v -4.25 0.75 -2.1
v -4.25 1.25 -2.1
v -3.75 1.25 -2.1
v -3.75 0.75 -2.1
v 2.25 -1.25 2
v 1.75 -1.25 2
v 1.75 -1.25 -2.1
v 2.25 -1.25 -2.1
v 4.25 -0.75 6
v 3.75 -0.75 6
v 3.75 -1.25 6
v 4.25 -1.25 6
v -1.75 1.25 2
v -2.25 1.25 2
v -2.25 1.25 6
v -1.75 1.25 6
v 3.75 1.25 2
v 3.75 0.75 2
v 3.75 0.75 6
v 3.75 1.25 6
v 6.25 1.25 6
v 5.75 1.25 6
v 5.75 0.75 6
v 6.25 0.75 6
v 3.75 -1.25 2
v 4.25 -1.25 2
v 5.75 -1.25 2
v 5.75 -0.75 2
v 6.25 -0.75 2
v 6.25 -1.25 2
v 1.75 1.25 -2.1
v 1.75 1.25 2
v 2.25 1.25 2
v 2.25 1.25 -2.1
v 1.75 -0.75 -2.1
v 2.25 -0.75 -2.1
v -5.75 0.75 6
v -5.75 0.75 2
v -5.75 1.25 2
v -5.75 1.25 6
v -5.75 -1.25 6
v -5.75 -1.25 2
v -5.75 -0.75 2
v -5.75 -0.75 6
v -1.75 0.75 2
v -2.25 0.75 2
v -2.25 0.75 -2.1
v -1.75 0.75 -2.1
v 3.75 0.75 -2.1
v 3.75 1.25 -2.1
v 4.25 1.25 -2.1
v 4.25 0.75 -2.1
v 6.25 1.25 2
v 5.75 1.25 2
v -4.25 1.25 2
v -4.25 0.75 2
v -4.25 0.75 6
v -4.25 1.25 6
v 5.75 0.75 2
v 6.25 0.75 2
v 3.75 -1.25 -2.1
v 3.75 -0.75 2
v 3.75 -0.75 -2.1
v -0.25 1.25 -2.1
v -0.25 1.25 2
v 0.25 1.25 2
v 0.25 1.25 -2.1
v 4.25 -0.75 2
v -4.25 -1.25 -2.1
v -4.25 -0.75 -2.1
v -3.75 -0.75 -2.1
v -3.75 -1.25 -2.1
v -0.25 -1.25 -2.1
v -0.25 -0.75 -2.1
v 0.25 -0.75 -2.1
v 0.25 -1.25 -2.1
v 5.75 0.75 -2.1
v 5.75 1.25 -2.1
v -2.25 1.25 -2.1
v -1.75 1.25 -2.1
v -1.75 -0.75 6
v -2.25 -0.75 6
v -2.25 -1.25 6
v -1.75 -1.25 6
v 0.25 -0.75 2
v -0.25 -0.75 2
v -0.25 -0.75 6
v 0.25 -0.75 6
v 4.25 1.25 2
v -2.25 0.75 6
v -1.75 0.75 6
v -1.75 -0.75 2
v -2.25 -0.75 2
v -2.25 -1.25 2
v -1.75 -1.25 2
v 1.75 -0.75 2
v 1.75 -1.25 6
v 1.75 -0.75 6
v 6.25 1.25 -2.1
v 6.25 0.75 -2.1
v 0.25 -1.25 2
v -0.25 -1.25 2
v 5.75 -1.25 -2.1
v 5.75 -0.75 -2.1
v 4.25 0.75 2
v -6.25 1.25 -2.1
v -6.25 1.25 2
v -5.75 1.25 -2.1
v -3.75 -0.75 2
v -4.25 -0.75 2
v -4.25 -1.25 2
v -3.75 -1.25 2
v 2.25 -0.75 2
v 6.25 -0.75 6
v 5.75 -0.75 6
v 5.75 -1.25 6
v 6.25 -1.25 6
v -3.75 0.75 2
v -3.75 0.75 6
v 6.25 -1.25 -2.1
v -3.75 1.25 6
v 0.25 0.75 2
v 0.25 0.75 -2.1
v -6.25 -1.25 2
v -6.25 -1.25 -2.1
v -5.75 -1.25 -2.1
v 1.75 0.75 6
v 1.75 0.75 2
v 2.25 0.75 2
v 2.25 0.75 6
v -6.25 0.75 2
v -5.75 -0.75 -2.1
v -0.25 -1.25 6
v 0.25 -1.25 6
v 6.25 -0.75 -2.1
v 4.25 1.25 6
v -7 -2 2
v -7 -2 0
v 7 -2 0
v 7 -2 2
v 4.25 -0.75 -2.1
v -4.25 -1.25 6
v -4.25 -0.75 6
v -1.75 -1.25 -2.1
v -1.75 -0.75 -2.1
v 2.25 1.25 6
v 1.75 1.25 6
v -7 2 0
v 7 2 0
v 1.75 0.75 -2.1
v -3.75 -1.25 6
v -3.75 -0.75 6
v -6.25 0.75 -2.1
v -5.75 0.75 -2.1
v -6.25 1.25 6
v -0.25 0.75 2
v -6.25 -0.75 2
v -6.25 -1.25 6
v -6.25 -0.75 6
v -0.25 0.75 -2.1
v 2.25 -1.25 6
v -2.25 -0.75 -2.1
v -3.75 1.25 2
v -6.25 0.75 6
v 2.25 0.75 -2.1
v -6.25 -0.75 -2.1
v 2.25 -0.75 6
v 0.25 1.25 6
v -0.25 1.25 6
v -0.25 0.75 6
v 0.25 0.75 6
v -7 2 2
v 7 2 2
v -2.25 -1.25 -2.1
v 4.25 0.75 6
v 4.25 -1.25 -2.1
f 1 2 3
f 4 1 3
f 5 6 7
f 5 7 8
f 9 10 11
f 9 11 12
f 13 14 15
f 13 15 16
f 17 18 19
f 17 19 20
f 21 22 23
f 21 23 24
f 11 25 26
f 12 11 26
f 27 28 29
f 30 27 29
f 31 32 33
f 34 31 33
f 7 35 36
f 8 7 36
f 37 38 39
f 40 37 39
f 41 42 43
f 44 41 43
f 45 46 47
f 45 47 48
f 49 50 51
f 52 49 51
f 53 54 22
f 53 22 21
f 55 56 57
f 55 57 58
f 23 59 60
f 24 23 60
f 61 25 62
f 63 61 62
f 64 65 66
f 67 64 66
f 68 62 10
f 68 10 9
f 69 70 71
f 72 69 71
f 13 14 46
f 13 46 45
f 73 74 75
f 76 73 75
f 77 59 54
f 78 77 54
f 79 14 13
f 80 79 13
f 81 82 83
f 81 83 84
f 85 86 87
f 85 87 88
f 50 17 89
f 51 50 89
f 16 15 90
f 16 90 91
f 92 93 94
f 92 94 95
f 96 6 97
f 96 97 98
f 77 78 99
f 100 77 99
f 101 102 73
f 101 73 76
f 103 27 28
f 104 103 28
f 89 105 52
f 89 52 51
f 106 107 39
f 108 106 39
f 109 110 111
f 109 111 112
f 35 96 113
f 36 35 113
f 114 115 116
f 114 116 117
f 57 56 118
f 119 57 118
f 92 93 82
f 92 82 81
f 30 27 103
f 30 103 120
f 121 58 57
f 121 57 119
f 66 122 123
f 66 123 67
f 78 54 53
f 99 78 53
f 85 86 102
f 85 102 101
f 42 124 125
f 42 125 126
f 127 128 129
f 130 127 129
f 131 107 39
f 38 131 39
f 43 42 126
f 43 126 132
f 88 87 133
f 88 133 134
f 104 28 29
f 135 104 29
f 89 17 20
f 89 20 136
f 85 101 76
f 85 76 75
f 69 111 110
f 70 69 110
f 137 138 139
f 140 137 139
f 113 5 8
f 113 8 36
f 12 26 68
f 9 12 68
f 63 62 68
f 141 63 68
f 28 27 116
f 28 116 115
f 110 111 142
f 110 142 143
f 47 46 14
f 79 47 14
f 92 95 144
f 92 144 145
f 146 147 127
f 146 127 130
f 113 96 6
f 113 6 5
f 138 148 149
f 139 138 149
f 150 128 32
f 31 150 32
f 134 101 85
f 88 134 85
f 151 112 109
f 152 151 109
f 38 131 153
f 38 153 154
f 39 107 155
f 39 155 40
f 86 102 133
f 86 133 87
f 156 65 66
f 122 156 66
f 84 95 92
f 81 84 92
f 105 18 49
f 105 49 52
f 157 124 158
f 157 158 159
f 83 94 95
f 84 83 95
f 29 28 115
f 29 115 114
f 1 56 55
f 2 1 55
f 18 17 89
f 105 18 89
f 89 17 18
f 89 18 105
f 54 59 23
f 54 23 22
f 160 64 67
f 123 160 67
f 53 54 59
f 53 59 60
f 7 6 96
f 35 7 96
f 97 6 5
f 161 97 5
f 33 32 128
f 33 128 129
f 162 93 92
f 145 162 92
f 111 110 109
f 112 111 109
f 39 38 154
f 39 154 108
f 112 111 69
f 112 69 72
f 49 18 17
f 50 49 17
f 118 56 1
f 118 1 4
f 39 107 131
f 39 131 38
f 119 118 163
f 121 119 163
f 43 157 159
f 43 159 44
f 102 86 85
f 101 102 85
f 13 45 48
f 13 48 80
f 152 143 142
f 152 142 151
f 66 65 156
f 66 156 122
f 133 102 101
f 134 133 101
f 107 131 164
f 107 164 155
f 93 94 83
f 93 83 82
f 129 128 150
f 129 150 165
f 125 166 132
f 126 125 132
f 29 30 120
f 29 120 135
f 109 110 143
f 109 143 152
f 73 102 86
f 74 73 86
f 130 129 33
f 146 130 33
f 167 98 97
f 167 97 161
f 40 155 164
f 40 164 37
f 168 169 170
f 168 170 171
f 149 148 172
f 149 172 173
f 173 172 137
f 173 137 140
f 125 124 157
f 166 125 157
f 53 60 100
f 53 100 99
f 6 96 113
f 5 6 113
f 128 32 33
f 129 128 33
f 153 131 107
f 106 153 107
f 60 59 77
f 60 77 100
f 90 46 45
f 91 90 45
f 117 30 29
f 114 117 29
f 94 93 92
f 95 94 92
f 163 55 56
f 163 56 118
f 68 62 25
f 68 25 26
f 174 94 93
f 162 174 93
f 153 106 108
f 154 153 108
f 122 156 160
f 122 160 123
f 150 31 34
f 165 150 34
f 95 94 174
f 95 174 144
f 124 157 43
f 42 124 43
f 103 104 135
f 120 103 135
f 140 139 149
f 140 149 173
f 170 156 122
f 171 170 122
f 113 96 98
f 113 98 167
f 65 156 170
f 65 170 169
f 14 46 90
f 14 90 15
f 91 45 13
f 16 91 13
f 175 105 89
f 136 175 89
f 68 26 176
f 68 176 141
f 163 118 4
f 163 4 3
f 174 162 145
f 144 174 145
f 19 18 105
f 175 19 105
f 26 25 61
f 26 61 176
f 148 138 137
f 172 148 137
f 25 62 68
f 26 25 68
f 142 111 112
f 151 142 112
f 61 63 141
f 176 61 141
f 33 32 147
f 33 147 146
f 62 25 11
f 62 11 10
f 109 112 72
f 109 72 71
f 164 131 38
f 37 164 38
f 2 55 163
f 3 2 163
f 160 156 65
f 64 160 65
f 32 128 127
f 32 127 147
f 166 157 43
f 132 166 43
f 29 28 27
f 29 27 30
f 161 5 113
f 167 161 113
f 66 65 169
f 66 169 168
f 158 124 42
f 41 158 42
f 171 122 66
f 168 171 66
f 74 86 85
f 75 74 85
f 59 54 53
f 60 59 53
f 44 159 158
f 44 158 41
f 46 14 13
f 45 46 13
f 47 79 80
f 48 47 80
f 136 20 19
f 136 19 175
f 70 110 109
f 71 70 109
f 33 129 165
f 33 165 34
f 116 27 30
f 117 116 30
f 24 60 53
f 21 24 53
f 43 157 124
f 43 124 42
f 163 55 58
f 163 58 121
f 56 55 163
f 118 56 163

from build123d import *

# Parameters (mm, degrees)
F0_W     = 18
F0_H     = 4
F1_DEPTH = 2
F2_W     = 0.5
F2_H     = 0.5
F3_DEPTH = 4
F4_DEPTH = 4.1
F5_W     = 4.363794
F5_H     = 11.277623
F6_DEPTH = 4.001


with BuildPart() as f1:
    # F0 (on Top) → F1 (new body)
    with BuildSketch(Plane.XY):
        Rectangle(F0_W, F0_H)
    extrude(amount=F1_DEPTH)


with BuildPart() as f3:
    # F2 (on face) → F3 (new body)
    with BuildSketch(Plane.XY.offset(2)):
        with Locations((0, 1)):
            Rectangle(F2_W, F2_H)
        with Locations((0, -1)):
            Rectangle(F2_W, F2_H)
        with Locations((-2, -1)):
            Rectangle(F2_W, F2_H)
        with Locations((-2, 1)):
            Rectangle(F2_W, F2_H)
        with Locations((-4, -1)):
            Rectangle(F2_W, F2_H)
        with Locations((-4, 1)):
            Rectangle(F2_W, F2_H)
        with Locations((-6, -1)):
            Rectangle(F2_W, F2_H)
        with Locations((-6, 1)):
            Rectangle(F2_W, F2_H)
        with Locations((-8, 1)):
            Rectangle(F2_W, F2_H)
        with Locations((-8, -1)):
            Rectangle(F2_W, F2_H)
        with Locations((8, 1)):
            Rectangle(F2_W, F2_H)
        with Locations((6, -1)):
            Rectangle(F2_W, F2_H)
        with Locations((4, 1)):
            Rectangle(F2_W, F2_H)
        with Locations((4, -1)):
            Rectangle(F2_W, F2_H)
        with Locations((6, 1)):
            Rectangle(F2_W, F2_H)
        with Locations((8, -1)):
            Rectangle(F2_W, F2_H)
        with Locations((2, 1)):
            Rectangle(F2_W, F2_H)
        with Locations((2, -1)):
            Rectangle(F2_W, F2_H)
    extrude(amount=F3_DEPTH)


with BuildPart() as f4:
    # F2 (on face) → F4 (new body)
    with BuildSketch(Plane.XY.offset(2)):
        with Locations((0, 1)):
            Rectangle(F2_W, F2_H)
        with Locations((0, -1)):
            Rectangle(F2_W, F2_H)
        with Locations((-2, -1)):
            Rectangle(F2_W, F2_H)
        with Locations((-2, 1)):
            Rectangle(F2_W, F2_H)
        with Locations((-4, -1)):
            Rectangle(F2_W, F2_H)
        with Locations((-4, 1)):
            Rectangle(F2_W, F2_H)
        with Locations((-6, -1)):
            Rectangle(F2_W, F2_H)
        with Locations((-6, 1)):
            Rectangle(F2_W, F2_H)
        with Locations((-8, 1)):
            Rectangle(F2_W, F2_H)
        with Locations((-8, -1)):
            Rectangle(F2_W, F2_H)
        with Locations((8, 1)):
            Rectangle(F2_W, F2_H)
        with Locations((6, -1)):
            Rectangle(F2_W, F2_H)
        with Locations((4, 1)):
            Rectangle(F2_W, F2_H)
        with Locations((4, -1)):
            Rectangle(F2_W, F2_H)
        with Locations((6, 1)):
            Rectangle(F2_W, F2_H)
        with Locations((8, -1)):
            Rectangle(F2_W, F2_H)
        with Locations((2, 1)):
            Rectangle(F2_W, F2_H)
        with Locations((2, -1)):
            Rectangle(F2_W, F2_H)
    extrude(amount=-F4_DEPTH)


with BuildPart() as f6_tool:
    # F5 (on face) → F6 (new body, through all)
    with BuildSketch(Plane.XZ.offset(2)):
        with Locations((9.181897, 0.678828)):
            Rectangle(F5_W, F5_H)
        with Locations((-9.181897, 0.678828)):
            Rectangle(F5_W, F5_H)
    extrude(amount=-F6_DEPTH)


with BuildPart() as f1_1:
    add(f1.part)

    # F6: cut by f6_tool
    add(f6_tool.part, mode=Mode.SUBTRACT)


with BuildPart() as f3_1:
    add(f3.part)

    # F6: cut by f6_tool
    add(f6_tool.part, mode=Mode.SUBTRACT)


with BuildPart() as f4_1:
    add(f4.part)

    # F6: cut by f6_tool
    add(f6_tool.part, mode=Mode.SUBTRACT)


solid = Compound([f1_1.part, f3_1.part, f4_1.part])
